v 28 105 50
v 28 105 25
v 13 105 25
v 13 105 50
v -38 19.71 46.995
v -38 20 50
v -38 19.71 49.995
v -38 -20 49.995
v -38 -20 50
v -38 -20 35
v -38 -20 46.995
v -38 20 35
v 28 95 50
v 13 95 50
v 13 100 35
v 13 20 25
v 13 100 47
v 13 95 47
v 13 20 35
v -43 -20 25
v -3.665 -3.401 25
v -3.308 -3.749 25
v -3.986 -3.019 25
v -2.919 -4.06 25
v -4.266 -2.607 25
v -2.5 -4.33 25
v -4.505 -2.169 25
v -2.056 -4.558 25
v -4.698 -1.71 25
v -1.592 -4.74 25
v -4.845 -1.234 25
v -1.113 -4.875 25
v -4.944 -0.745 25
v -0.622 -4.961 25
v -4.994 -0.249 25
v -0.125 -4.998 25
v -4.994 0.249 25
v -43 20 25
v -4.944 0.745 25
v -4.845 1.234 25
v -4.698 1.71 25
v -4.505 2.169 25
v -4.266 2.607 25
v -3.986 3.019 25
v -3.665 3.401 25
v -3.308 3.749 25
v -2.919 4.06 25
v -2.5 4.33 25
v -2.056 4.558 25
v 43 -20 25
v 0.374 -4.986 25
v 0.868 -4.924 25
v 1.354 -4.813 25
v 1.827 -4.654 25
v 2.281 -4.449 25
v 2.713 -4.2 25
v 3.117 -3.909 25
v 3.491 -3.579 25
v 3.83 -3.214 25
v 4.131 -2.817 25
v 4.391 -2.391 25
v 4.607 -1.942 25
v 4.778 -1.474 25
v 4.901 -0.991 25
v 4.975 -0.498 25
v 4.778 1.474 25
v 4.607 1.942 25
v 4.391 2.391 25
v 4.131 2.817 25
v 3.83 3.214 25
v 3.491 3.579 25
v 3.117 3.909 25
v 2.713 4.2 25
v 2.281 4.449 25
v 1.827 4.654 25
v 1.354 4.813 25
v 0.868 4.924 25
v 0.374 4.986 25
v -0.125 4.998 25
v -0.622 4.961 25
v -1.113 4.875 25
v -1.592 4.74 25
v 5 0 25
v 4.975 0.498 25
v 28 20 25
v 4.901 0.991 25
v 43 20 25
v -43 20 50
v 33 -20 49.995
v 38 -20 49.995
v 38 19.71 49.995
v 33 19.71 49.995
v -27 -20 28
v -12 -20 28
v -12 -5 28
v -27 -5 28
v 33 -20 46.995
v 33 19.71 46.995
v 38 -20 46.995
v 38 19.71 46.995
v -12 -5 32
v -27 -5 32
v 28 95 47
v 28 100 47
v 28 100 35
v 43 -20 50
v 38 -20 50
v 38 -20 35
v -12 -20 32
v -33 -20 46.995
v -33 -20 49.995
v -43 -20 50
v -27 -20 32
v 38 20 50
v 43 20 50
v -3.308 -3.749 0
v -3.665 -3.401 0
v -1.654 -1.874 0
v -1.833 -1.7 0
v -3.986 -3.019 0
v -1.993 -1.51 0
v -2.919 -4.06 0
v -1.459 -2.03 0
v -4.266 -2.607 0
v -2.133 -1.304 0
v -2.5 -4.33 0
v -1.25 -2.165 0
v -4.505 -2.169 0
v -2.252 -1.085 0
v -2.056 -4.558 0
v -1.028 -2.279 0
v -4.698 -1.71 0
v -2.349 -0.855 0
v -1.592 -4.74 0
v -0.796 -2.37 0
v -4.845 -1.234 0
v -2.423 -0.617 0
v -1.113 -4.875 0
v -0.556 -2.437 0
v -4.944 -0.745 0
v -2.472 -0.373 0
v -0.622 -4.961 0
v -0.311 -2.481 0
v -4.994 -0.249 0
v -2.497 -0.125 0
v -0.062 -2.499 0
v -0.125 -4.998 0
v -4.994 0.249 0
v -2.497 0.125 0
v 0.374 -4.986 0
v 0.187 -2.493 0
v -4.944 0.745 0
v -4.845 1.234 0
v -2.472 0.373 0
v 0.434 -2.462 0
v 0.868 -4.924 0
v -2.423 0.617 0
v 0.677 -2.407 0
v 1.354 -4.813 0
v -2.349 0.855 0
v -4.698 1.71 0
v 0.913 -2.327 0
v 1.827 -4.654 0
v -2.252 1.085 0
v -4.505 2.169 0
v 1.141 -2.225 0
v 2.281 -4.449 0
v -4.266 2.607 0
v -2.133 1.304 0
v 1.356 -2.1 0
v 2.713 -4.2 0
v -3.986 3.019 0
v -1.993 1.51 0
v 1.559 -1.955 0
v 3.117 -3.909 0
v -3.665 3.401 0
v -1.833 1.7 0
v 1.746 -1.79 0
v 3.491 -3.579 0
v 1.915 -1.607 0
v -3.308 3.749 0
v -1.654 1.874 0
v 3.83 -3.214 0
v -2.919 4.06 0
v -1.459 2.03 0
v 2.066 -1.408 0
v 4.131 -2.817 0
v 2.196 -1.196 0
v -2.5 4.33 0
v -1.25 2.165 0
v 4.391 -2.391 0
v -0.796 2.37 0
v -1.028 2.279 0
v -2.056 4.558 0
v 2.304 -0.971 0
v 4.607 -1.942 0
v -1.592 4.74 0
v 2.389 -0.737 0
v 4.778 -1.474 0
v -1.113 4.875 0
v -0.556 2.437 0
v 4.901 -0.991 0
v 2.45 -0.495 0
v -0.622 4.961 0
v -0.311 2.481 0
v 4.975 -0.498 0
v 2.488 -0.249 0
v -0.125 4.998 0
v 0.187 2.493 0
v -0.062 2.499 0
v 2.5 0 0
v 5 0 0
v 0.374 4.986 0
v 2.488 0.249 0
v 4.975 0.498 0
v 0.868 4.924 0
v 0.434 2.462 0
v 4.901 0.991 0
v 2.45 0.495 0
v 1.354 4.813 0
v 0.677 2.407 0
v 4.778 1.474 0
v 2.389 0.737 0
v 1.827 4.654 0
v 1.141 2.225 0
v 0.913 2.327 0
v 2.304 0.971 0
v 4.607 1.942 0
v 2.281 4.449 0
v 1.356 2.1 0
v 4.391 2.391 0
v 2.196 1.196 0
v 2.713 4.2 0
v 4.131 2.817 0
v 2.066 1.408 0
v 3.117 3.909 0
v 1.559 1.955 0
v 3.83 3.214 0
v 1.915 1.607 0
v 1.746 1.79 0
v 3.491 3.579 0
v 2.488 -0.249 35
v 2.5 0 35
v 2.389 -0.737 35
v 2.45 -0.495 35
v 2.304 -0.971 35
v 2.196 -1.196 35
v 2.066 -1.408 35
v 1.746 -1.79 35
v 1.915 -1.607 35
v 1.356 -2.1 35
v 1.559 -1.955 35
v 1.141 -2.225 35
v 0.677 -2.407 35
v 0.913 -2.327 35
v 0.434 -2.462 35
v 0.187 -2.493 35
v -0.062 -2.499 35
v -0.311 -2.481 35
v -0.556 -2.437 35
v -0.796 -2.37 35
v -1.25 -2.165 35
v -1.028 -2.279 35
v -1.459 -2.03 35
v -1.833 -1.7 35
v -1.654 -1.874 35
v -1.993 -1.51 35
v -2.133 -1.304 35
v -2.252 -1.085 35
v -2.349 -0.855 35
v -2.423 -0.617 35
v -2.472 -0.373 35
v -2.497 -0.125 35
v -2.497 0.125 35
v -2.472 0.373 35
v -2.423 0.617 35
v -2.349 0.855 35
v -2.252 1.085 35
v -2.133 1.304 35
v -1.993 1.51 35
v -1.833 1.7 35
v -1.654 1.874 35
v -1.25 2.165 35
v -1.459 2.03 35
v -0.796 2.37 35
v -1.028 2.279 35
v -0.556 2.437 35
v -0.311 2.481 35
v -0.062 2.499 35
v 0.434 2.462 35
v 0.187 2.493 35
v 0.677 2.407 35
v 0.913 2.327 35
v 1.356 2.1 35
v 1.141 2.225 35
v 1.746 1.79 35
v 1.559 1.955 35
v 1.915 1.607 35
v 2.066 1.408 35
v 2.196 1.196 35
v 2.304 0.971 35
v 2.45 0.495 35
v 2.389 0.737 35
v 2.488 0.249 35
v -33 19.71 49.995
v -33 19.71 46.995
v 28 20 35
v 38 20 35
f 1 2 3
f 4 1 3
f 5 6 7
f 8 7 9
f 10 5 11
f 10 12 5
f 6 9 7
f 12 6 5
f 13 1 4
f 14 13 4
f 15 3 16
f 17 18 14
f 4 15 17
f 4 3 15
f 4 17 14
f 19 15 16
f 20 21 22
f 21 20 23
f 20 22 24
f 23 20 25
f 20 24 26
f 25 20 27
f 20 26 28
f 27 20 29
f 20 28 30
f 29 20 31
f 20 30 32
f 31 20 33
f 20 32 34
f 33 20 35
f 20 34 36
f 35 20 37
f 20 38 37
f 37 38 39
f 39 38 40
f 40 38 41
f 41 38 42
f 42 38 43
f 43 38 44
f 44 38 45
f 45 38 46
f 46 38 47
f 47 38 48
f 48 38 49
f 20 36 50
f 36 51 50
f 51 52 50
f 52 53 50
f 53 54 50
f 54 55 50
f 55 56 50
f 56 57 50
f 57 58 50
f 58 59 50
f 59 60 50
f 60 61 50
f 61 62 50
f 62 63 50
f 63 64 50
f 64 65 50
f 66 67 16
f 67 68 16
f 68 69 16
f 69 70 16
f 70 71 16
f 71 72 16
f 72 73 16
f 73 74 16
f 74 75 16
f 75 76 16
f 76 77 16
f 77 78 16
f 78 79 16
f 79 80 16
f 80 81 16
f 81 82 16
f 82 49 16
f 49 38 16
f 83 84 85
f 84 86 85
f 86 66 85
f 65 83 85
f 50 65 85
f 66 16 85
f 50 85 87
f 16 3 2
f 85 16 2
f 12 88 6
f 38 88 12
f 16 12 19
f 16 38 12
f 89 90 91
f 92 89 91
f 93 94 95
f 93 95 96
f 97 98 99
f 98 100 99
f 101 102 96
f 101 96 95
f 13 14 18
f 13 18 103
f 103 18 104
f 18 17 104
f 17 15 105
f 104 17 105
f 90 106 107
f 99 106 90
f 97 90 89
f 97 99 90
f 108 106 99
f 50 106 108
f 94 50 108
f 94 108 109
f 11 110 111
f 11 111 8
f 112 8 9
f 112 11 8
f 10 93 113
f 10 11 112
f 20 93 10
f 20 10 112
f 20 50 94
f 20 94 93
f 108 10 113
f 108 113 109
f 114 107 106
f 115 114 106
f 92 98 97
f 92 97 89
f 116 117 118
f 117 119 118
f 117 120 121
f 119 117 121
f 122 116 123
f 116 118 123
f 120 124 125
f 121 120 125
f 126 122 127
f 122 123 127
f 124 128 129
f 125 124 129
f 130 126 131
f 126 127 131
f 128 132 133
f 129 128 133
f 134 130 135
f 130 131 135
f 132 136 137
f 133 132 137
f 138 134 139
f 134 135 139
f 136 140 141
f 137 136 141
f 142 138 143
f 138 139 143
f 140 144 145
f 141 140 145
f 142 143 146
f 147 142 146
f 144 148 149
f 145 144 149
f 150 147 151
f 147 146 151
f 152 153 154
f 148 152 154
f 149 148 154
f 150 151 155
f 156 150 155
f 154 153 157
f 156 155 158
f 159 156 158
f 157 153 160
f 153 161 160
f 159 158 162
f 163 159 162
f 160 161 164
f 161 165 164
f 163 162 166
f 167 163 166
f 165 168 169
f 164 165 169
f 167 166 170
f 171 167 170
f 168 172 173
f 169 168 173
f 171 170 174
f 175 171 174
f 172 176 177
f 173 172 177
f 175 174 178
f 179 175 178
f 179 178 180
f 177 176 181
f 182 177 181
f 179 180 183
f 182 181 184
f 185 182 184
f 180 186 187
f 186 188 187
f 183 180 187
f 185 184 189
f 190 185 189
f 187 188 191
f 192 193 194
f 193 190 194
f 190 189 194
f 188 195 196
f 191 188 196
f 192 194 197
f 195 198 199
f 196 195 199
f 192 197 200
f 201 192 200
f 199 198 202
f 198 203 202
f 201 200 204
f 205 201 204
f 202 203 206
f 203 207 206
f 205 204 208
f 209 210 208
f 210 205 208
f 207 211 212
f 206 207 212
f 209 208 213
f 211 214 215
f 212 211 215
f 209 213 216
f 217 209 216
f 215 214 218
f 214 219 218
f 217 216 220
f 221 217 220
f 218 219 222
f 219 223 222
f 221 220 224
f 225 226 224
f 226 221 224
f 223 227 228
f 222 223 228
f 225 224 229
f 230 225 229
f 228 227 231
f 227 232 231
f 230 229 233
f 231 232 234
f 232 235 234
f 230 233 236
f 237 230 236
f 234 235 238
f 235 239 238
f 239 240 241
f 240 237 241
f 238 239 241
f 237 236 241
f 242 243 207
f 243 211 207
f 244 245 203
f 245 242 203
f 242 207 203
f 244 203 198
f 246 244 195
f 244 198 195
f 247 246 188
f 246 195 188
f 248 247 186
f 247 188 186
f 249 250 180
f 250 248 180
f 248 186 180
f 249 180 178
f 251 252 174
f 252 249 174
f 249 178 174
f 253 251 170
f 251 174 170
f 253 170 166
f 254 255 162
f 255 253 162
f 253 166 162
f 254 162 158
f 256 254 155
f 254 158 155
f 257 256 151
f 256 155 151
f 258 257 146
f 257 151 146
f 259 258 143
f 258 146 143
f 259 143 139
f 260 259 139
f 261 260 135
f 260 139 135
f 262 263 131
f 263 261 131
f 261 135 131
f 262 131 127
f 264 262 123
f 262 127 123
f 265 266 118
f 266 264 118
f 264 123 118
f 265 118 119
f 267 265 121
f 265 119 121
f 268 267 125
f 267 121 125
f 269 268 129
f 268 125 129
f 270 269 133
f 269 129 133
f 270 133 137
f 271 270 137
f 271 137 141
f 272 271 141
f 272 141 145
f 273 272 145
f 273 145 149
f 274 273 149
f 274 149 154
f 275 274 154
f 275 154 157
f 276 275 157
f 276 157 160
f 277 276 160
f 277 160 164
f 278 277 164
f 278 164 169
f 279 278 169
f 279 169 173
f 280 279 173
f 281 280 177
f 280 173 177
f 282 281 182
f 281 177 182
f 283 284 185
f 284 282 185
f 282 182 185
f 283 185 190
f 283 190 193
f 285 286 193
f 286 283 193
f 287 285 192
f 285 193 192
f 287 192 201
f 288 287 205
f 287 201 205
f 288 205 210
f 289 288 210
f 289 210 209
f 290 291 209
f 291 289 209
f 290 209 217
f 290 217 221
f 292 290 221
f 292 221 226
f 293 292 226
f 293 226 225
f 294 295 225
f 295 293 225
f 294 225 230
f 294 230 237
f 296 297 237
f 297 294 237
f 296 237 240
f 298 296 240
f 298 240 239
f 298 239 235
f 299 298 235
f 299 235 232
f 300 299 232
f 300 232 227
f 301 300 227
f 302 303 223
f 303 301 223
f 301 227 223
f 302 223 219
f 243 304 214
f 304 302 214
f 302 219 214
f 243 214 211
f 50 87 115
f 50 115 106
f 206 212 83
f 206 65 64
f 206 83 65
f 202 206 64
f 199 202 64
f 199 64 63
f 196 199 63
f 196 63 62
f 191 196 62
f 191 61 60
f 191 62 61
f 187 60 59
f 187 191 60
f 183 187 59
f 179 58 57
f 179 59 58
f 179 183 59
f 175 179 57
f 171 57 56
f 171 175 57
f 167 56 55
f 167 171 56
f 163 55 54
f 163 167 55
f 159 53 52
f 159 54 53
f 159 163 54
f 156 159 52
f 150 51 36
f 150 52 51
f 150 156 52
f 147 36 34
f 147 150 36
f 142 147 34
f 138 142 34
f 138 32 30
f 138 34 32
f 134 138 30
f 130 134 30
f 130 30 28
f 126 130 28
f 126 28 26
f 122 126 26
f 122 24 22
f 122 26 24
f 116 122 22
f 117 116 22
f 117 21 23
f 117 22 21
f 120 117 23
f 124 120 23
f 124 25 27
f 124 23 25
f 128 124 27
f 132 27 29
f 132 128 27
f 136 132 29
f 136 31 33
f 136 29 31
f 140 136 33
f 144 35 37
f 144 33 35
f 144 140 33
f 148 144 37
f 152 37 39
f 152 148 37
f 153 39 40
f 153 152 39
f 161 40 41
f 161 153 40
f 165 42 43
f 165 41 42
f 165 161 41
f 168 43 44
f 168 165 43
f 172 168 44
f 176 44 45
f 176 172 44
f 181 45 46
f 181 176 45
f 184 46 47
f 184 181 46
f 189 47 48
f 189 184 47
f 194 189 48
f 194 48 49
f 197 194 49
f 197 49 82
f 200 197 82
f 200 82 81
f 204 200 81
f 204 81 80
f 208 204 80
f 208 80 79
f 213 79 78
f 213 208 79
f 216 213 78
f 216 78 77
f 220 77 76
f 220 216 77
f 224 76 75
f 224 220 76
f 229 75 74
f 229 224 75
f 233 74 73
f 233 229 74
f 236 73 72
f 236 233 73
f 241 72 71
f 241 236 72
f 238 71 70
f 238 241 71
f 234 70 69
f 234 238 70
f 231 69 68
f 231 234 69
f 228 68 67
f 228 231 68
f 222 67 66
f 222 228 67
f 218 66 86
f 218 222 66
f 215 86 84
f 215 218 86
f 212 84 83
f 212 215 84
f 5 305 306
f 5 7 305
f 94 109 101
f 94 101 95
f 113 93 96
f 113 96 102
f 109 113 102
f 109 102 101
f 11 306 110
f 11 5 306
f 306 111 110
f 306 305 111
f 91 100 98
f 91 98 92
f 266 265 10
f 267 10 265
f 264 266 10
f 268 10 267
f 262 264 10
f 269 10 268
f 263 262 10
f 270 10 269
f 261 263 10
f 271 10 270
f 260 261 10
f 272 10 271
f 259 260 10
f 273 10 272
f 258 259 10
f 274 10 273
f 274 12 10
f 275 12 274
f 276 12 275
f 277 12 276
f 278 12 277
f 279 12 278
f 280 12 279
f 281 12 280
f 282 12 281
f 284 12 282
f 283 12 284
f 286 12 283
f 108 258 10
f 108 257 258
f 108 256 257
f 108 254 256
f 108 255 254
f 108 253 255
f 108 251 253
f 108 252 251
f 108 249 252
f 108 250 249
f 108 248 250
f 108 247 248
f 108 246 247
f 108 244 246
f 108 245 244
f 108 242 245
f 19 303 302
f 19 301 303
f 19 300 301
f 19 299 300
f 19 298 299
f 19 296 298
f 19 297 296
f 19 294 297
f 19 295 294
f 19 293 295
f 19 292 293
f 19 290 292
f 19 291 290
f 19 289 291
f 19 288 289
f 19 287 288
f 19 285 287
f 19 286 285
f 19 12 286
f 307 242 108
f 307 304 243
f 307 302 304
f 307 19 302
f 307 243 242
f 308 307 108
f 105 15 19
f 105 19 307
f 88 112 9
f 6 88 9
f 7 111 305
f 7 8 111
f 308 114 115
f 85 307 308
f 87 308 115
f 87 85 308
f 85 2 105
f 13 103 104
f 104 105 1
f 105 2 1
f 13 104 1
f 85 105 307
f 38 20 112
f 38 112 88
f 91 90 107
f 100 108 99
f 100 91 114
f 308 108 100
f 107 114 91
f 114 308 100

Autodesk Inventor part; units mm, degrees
ref_plane "YZ Plane" through (0, 0, 0) normal (1, 0, 0) x (0, 1, 0)
ref_plane "XZ Plane" through (0, 0, 0) normal (0, 1, 0) x (-1, 0, 0)
ref_plane "XY Plane" through (0, 0, 0) normal (0, 0, 1) x (1, 0, 0)
sketch "Sketch1" plane through (0, 0, 0) normal (0, 0, 1) x (1, 0, 0)
  circle A0 centre (0, 0) radius 5
  circle A1 centre (0, 0) radius 2.5
  dimension "d0" = 10
  dimension "d1" = 5
extrude "Extrusion1" add sketch "Sketch1" along normal blind 25
sketch "Sketch2" plane through (0, 0, 25) normal (0, 0, 1) x (1, 0, 0)
  line L0 (0, 20) -> (38, 20)
  line L1 (38, 20) -> (38, -20)
  line L2 (38, -20) -> (-38, -20)
  line L3 (-38, -20) -> (-38, 20)
  line L4 (-38, 20) -> (0, 20)
  circle A0 centre (0, 0) radius 2.5
  dimension "d4" = 20
  dimension "d6" = 38
  dimension "d7" = 40
  dimension "d8" = 76
  dimension "d9" = 40
extrude "Extrusion2" add sketch "Sketch2" along normal blind 10
sketch "Sketch3" plane through (0, 0, 35) normal (0, 0, 1) x (1, 0, 0)
  line L0 (38, 20) -> (-38, 20) projected
  line L1 (38, 20) -> (43, 20)
  line L2 (43, 20) -> (43, -20)
  line L3 (43, -20) -> (38, -20)
  line L4 (38, -20) -> (38, 20)
  line L5 (-38, 20) -> (-38, -20) projected
  line L6 (-38, -20) -> (-43, -20)
  line L7 (-43, -20) -> (-43, 20)
  line L8 (-43, 20) -> (-38, 20)
  line L9 (-38, 20) -> (-38, -20)
  point P0 (0, 0)
  dimension "d12" = 5
  dimension "d13" = 40
  dimension "d14" = 5
extrude "Extrusion3" add sketch "Sketch3" along normal blind 15 and the other way blind 10
sketch "Sketch4" plane through (-38, -20, 35) normal (1, 0, 0) x (0, 0, -1)
  point P0 (35, 20)
sketch "Sketch5" plane through (-38, -20, 35) normal (1, 0, 0) x (0, 0, -1)
  line L0 (0, 0) -> (-15, 0) projected
  line L1 (-14.9948, 39.7098) -> (-11.9948, 39.7098)
  line L2 (-11.9948, 39.7098) -> (-11.9948, 0)
  line L3 (-11.9948, 0) -> (-14.9948, 0)
  line L4 (-14.9948, 0) -> (-14.9948, 39.7098)
  point P0 (35, 20)
  dimension "d19" = 3
extrude "Extrusion4" add sketch "Sketch5" along normal blind 5
sketch "Sketch6" plane through (38, -20, 35) normal (-1, 0, 0) x (0, 0, 1)
  line L0 (11.9948, 39.7098) -> (14.9948, 39.7098) projected
  line L1 (11.9948, 39.7098) -> (11.9948, 0) projected
  line L2 (14.9948, 39.7098) -> (11.9948, 39.7098)
  line L3 (11.9948, 39.7098) -> (11.9948, 0)
  line L4 (11.9948, 0) -> (14.9948, 0)
  line L5 (14.9948, 0) -> (14.9948, 39.7098)
  point P0 (-35, 20)
extrude "Extrusion5" add sketch "Sketch6" along normal blind 5
sketch "Sketch11" plane through (-43, 20, 25) normal (0, 1, 0) x (1, 0, 0)
  line L0 (5, -10) -> (81, -10) projected
  line L1 (86, 0) -> (0, 0) projected
  line L2 (56, -10) -> (71, -10)
  line L3 (71, -10) -> (71, 0)
  line L4 (71, 0) -> (56, 0)
  line L5 (56, 0) -> (56, -10)
  point P0 (43, 25)
  dimension "d39" = 15
extrude "Extrusion8" add sketch "Sketch11" along normal blind 85
sketch "Sketch12" plane through (0, 0, 35) normal (0, 0, 1) x (1, 0, 0)
  line L0 (13, 20) -> (13, 105) projected
  line L1 (13, 105) -> (13, 100)
  line L2 (13, 100) -> (28, 100)
  line L3 (28, 100) -> (28, 105)
  line L4 (28, 105) -> (13, 105)
  point P0 (0, 0)
  dimension "d42" = 5
  dimension "d43" = 15
extrude "Extrusion9" add sketch "Sketch12" along normal blind 15
sketch "Sketch13" plane through (13, 100, 35) normal (0, -1, 0) x (1, 0, 0)
  line L0 (0, -10) -> (0, 15) projected
  line L1 (0, 15) -> (0, 12)
  line L2 (0, 12) -> (15, 12)
  line L3 (15, 12) -> (15, 15)
  line L4 (15, 15) -> (0, 15)
  point P0 (-13, -35)
  dimension "d46" = 3
  dimension "d47" = 15
extrude "Extrusion10" add sketch "Sketch13" along normal blind 5
sketch "Sketch14" plane through (-43, -20, 25) normal (0, -1, 0) x (1, 0, 0)
  line L0 (0, 0) -> (86, 0) projected
  line L1 (43, 0) -> (31, 0)
  point P0 (43, -25)
  point P1 (56, 0)
  dimension "d50" = 12
sketch "Sketch15" plane through (-43, -20, 25) normal (0, -1, 0) x (1, 0, 0)
  line L0 (48, 0) -> (38, 0) projected
  line L1 (43, 0) -> (31, 0)
  line L2 (31, 0) -> (31, 3)
  line L3 (31, 3) -> (16, 3)
  line L4 (16, 3) -> (16, 7)
  line L5 (16, 7) -> (31, 7)
  line L6 (31, 7) -> (31, 3)
  point P0 (43, -25)
  dimension "d51" = 12
  dimension "d52" = 3
  dimension "d53" = 15
  dimension "d54" = 4
extrude "Extrusion11" cut sketch "Sketch15" against normal blind 15
properties part number "Holder"
